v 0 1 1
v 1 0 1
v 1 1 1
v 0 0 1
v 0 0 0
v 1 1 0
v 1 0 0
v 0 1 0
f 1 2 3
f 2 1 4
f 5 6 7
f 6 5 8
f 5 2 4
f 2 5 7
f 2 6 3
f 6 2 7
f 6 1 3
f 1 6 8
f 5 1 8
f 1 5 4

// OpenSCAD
/* [Animation] */
// rotating animation
animation_rotation = false;

$vpt = animation_rotation ? [0, 0, 0] : [];
$vpr = animation_rotation ? [70, 0, 365 * $t] : [];
$vpd = animation_rotation ? 100 : [];

cube();
